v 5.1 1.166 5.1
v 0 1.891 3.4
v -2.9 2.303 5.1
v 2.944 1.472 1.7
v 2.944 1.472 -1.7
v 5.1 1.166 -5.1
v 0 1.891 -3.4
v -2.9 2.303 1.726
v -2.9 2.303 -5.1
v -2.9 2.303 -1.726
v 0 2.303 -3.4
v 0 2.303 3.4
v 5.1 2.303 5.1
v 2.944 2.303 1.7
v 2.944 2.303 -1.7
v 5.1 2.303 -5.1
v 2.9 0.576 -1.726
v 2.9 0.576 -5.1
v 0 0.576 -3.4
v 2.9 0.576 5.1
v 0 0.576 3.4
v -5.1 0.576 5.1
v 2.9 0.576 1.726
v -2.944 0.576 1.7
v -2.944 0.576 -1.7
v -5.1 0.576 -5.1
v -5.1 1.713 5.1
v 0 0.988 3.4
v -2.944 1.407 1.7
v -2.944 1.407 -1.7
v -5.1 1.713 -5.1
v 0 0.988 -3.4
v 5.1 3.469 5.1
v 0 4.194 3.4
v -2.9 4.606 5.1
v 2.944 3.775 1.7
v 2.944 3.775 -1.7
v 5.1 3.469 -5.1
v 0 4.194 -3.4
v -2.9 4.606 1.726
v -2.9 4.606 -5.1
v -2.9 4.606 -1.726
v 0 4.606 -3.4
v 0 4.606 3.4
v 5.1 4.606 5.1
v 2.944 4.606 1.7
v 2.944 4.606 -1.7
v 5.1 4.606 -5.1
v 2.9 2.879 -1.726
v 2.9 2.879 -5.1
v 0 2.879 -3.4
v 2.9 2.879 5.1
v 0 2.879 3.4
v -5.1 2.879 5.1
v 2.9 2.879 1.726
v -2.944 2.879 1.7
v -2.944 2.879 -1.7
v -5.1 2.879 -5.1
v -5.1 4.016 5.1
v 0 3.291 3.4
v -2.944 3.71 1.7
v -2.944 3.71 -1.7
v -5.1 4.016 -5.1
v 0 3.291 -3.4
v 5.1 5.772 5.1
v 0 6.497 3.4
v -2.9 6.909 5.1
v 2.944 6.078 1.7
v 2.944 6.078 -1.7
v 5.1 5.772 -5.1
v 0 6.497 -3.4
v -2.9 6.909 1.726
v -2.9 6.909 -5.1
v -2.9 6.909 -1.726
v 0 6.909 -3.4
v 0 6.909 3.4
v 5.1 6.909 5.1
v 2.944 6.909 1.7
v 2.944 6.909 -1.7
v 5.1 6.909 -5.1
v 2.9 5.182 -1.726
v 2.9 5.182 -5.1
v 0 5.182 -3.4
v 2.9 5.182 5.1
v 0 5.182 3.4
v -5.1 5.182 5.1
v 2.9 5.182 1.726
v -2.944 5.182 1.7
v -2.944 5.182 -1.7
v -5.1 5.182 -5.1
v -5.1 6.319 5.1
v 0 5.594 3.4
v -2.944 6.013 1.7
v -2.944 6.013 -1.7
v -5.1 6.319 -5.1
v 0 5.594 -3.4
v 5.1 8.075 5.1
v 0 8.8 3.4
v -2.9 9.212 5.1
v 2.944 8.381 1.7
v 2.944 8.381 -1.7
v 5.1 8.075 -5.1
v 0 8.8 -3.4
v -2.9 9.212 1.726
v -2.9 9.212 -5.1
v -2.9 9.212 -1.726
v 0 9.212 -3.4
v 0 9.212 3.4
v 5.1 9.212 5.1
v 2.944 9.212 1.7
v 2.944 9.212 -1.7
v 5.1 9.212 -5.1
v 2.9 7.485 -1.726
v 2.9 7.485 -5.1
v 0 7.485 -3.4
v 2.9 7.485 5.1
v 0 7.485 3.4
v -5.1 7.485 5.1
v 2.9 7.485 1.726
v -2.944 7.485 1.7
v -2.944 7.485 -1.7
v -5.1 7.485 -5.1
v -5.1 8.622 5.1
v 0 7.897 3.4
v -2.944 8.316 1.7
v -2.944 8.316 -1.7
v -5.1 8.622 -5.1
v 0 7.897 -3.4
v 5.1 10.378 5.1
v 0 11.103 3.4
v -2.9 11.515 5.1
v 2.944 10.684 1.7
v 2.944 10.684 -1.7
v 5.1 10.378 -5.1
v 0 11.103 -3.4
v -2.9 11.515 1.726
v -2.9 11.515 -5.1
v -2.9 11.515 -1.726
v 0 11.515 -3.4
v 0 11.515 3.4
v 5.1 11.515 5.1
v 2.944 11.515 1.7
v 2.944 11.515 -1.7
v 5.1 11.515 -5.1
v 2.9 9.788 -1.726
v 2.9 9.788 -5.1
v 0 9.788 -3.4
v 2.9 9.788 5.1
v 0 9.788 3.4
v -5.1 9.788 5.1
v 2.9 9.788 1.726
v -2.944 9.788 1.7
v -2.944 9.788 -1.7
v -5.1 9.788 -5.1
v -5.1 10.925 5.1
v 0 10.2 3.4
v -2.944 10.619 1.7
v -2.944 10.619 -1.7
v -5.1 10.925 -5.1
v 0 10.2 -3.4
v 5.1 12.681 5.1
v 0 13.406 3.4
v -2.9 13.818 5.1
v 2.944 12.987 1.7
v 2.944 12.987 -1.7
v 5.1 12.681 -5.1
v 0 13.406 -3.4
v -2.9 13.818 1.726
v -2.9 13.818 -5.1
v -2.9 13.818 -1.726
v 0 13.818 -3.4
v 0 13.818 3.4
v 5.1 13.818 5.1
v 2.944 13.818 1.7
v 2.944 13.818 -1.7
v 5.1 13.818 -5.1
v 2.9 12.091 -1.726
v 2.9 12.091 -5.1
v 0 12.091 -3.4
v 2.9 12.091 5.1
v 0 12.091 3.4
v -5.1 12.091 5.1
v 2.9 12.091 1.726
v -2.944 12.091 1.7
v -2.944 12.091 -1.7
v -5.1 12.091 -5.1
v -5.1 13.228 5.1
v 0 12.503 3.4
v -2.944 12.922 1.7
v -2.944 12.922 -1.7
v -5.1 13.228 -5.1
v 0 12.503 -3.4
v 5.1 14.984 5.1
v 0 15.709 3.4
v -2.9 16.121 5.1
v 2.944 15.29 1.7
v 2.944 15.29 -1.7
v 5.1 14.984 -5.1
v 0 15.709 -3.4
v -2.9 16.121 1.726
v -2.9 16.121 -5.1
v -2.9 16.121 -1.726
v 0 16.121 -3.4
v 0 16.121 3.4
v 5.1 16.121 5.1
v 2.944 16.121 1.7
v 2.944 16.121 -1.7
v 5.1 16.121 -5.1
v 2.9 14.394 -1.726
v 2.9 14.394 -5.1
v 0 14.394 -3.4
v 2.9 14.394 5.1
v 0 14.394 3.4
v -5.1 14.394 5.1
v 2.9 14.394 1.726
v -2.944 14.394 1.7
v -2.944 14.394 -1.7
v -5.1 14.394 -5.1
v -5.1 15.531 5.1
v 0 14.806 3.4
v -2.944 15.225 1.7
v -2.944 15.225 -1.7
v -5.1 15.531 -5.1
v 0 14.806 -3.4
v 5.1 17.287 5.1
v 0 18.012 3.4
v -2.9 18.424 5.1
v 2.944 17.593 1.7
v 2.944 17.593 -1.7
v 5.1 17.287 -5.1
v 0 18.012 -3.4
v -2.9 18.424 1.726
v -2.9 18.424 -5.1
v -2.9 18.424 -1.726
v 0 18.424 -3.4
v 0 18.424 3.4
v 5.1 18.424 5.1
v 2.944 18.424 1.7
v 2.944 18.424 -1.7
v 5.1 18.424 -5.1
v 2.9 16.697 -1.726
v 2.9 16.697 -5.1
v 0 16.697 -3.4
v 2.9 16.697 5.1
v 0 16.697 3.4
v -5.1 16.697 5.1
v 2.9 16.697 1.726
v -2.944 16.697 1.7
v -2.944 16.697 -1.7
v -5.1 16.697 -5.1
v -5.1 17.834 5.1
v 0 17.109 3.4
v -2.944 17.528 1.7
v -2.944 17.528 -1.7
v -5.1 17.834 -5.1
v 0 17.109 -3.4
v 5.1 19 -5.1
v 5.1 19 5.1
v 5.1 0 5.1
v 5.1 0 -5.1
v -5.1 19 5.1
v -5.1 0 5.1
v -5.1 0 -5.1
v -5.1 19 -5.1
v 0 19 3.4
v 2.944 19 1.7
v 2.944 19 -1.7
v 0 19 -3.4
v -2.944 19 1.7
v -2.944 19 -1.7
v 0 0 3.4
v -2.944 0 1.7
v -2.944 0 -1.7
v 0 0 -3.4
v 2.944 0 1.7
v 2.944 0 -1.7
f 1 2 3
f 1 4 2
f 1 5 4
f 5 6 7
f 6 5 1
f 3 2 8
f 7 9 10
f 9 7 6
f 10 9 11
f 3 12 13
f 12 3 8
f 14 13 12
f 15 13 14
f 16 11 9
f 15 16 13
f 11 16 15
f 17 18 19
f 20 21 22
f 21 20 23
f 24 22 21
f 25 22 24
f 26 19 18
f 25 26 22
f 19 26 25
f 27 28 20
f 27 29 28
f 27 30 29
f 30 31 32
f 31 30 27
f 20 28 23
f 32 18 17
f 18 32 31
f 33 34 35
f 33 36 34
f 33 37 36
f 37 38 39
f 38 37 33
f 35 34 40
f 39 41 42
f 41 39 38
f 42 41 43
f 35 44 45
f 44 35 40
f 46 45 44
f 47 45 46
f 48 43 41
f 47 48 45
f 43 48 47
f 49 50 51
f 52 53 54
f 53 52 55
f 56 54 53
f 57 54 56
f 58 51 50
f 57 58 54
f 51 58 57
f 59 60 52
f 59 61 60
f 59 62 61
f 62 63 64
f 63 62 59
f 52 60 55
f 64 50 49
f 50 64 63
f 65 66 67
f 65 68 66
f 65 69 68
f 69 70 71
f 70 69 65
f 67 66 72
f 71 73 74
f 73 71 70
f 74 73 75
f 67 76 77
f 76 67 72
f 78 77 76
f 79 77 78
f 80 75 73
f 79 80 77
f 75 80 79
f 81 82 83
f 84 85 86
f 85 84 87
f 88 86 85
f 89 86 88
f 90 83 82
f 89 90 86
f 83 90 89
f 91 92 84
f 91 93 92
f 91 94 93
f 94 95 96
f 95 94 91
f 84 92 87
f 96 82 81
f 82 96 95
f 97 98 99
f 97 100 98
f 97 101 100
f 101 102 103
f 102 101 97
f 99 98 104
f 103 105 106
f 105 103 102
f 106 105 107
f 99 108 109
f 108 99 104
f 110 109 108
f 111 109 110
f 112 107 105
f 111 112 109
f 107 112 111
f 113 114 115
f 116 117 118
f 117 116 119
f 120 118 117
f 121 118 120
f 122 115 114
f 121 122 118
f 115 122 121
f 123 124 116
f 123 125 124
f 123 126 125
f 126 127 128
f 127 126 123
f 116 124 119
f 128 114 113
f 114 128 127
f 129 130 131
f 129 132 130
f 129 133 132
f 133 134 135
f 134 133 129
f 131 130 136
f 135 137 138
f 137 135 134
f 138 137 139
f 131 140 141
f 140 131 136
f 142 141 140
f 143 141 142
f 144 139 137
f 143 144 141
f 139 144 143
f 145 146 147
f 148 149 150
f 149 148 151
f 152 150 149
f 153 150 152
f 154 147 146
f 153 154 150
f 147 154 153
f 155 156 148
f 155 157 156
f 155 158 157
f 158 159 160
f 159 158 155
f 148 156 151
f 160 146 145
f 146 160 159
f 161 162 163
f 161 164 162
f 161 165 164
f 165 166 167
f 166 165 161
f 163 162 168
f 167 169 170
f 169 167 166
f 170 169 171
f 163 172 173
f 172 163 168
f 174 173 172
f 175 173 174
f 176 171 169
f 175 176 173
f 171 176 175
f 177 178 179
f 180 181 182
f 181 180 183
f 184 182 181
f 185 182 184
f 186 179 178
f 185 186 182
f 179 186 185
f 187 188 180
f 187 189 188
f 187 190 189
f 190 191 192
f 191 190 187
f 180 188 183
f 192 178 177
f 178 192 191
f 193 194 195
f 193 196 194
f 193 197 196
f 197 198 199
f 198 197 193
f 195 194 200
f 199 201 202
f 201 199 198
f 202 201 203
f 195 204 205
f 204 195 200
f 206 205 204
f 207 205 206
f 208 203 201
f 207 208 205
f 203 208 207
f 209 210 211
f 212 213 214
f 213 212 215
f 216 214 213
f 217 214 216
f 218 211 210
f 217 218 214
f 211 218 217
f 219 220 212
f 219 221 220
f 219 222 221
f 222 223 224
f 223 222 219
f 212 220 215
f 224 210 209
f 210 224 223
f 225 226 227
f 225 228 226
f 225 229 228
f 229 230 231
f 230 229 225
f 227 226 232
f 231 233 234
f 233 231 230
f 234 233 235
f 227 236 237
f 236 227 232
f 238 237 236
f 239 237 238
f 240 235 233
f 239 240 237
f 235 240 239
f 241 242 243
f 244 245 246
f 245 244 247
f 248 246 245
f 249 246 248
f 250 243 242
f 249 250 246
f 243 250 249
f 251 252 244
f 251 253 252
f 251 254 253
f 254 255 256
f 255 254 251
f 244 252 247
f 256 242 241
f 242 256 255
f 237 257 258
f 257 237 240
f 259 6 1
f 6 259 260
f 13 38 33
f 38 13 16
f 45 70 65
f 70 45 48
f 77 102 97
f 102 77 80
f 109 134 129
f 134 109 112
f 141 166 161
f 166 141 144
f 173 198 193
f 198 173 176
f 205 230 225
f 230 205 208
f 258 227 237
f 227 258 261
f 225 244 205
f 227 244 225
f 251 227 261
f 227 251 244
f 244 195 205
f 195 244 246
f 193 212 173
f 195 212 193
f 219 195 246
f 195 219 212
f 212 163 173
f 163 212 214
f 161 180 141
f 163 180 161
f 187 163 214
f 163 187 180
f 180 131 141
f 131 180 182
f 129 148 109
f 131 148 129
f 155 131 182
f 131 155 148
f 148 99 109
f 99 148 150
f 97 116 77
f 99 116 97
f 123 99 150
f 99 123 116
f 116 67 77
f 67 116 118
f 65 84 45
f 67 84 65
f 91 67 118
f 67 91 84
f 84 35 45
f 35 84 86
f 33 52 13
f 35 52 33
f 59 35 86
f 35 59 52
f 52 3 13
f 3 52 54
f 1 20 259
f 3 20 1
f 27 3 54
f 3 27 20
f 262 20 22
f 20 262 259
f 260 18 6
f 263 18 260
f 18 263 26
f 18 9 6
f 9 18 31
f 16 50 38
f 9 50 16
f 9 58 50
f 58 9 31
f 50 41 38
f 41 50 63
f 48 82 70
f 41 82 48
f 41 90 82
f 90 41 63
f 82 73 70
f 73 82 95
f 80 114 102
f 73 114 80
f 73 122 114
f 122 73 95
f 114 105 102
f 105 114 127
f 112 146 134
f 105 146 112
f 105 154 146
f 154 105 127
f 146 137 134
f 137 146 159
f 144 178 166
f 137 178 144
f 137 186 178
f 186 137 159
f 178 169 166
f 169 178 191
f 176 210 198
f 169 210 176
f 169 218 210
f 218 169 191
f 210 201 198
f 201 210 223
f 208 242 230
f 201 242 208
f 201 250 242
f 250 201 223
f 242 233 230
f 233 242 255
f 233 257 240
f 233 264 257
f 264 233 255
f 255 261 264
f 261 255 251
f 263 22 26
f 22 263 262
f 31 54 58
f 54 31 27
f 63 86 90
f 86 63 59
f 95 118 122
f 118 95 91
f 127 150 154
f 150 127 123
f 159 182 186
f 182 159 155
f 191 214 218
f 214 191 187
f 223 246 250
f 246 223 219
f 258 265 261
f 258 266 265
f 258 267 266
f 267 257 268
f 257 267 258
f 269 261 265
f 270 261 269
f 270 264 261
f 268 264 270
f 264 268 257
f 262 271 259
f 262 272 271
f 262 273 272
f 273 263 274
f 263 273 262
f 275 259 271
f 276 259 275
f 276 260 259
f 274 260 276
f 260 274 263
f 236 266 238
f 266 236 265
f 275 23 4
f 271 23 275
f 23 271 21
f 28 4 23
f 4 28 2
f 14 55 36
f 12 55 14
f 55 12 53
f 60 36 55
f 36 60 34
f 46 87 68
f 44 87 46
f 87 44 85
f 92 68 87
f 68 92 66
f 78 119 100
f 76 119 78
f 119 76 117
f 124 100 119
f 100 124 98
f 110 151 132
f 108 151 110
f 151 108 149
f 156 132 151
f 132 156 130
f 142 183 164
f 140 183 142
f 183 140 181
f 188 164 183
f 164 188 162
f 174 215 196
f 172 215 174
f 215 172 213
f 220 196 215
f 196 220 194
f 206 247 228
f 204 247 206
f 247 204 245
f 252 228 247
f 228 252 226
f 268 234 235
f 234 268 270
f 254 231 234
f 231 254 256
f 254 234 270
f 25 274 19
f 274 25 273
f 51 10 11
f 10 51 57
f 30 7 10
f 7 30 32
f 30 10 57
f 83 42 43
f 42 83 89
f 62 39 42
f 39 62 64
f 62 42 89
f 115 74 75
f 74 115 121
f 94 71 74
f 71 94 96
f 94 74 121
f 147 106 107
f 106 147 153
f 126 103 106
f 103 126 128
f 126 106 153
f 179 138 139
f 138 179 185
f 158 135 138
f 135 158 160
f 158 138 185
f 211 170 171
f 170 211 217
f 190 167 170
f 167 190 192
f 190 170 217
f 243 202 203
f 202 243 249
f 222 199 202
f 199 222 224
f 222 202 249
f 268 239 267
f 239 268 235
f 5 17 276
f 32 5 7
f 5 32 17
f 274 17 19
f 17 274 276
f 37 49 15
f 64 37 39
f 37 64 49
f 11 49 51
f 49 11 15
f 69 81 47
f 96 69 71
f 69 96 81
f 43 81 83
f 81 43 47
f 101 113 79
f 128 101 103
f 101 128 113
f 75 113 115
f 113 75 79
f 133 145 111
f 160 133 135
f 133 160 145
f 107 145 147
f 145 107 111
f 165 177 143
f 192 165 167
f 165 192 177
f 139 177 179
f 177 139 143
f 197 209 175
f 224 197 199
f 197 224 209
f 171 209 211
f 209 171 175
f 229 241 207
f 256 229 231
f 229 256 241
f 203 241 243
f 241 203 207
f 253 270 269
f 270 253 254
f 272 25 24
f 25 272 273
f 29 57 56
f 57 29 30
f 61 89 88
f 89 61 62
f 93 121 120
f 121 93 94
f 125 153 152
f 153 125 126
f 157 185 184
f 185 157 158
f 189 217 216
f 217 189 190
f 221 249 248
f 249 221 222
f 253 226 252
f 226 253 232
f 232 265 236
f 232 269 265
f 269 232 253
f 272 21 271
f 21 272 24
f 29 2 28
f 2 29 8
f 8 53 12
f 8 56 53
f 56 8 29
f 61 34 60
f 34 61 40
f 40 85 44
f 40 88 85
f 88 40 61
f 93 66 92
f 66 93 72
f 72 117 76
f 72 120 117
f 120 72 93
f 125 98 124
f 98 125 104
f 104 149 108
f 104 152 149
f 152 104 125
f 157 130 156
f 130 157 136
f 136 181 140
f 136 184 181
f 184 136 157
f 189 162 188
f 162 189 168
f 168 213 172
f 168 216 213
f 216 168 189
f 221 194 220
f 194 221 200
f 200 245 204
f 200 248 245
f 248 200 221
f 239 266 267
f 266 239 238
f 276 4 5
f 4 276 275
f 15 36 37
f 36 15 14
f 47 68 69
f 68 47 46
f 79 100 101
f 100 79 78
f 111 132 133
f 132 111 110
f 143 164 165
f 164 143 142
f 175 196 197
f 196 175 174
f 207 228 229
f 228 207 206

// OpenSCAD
//  The length of the spring
length = 19;

//  Dimension of the frontal square form of the spring
radiusSpring = 5.1;

//  Radius of the (optional) hole through the spring
radiusHole = 6.8 / 2;

//  Amount of leaves in the spring
cuts = 16;  //   [2,4,6,8,10,12,14,16,18,20,22,24,26,28,30,32,34,36,38,39,40,42,44,46,48,50]

//  Depth of the leaves
cutDepth = 8;

module spring(){
    difference(){
        translate([-radiusSpring, 0, -radiusSpring]){
            cube([2 * radiusSpring, length, 2 * radiusSpring]);
        }
        rotate([-90,30,0]){
            translate([0,0,-0.1]){
                cylinder(r = radiusHole, h = length + 0.2, $fn = 6);
            }
        }
        translate([-radiusSpring, 0, -radiusSpring]){
            triangleCut();
        }
    }
}

module triangleCut(){
    length2 = length * cuts / (cuts + 0.5);
    for(i = [1:cuts]){
        if(i%2 == 0){
            translate([0,0,-0.1]){
                linear_extrude(height = 2 * radiusSpring + 0.2){
                    polygon(points  =   [   [-0.1, length2 / cuts * (i - 1.5)],
                                            [cutDepth, length2 / cuts * (i - 1.5)],
                                            [-0.1, length2 / cuts * (i - 0.5)],
                                        ],
                            paths = [[0,1,2]]);
                }
            }
        }
        else{
            translate([0,0,-0.1]){
                linear_extrude(height = 2 * radiusSpring + 0.2){
                    polygon(points  =   [   [2 * radiusSpring + 0.1, length2 / cuts * (i + 1)],
                                                [-cutDepth +2 * radiusSpring, length2 / cuts * (i + 1)],
                                                [2 * radiusSpring + 0.1, length2 / cuts * (i)],
                                            ],
                                paths = [[0,1,2]]);
                }
            }
        }
    }
}

spring();
//triangleCut();
